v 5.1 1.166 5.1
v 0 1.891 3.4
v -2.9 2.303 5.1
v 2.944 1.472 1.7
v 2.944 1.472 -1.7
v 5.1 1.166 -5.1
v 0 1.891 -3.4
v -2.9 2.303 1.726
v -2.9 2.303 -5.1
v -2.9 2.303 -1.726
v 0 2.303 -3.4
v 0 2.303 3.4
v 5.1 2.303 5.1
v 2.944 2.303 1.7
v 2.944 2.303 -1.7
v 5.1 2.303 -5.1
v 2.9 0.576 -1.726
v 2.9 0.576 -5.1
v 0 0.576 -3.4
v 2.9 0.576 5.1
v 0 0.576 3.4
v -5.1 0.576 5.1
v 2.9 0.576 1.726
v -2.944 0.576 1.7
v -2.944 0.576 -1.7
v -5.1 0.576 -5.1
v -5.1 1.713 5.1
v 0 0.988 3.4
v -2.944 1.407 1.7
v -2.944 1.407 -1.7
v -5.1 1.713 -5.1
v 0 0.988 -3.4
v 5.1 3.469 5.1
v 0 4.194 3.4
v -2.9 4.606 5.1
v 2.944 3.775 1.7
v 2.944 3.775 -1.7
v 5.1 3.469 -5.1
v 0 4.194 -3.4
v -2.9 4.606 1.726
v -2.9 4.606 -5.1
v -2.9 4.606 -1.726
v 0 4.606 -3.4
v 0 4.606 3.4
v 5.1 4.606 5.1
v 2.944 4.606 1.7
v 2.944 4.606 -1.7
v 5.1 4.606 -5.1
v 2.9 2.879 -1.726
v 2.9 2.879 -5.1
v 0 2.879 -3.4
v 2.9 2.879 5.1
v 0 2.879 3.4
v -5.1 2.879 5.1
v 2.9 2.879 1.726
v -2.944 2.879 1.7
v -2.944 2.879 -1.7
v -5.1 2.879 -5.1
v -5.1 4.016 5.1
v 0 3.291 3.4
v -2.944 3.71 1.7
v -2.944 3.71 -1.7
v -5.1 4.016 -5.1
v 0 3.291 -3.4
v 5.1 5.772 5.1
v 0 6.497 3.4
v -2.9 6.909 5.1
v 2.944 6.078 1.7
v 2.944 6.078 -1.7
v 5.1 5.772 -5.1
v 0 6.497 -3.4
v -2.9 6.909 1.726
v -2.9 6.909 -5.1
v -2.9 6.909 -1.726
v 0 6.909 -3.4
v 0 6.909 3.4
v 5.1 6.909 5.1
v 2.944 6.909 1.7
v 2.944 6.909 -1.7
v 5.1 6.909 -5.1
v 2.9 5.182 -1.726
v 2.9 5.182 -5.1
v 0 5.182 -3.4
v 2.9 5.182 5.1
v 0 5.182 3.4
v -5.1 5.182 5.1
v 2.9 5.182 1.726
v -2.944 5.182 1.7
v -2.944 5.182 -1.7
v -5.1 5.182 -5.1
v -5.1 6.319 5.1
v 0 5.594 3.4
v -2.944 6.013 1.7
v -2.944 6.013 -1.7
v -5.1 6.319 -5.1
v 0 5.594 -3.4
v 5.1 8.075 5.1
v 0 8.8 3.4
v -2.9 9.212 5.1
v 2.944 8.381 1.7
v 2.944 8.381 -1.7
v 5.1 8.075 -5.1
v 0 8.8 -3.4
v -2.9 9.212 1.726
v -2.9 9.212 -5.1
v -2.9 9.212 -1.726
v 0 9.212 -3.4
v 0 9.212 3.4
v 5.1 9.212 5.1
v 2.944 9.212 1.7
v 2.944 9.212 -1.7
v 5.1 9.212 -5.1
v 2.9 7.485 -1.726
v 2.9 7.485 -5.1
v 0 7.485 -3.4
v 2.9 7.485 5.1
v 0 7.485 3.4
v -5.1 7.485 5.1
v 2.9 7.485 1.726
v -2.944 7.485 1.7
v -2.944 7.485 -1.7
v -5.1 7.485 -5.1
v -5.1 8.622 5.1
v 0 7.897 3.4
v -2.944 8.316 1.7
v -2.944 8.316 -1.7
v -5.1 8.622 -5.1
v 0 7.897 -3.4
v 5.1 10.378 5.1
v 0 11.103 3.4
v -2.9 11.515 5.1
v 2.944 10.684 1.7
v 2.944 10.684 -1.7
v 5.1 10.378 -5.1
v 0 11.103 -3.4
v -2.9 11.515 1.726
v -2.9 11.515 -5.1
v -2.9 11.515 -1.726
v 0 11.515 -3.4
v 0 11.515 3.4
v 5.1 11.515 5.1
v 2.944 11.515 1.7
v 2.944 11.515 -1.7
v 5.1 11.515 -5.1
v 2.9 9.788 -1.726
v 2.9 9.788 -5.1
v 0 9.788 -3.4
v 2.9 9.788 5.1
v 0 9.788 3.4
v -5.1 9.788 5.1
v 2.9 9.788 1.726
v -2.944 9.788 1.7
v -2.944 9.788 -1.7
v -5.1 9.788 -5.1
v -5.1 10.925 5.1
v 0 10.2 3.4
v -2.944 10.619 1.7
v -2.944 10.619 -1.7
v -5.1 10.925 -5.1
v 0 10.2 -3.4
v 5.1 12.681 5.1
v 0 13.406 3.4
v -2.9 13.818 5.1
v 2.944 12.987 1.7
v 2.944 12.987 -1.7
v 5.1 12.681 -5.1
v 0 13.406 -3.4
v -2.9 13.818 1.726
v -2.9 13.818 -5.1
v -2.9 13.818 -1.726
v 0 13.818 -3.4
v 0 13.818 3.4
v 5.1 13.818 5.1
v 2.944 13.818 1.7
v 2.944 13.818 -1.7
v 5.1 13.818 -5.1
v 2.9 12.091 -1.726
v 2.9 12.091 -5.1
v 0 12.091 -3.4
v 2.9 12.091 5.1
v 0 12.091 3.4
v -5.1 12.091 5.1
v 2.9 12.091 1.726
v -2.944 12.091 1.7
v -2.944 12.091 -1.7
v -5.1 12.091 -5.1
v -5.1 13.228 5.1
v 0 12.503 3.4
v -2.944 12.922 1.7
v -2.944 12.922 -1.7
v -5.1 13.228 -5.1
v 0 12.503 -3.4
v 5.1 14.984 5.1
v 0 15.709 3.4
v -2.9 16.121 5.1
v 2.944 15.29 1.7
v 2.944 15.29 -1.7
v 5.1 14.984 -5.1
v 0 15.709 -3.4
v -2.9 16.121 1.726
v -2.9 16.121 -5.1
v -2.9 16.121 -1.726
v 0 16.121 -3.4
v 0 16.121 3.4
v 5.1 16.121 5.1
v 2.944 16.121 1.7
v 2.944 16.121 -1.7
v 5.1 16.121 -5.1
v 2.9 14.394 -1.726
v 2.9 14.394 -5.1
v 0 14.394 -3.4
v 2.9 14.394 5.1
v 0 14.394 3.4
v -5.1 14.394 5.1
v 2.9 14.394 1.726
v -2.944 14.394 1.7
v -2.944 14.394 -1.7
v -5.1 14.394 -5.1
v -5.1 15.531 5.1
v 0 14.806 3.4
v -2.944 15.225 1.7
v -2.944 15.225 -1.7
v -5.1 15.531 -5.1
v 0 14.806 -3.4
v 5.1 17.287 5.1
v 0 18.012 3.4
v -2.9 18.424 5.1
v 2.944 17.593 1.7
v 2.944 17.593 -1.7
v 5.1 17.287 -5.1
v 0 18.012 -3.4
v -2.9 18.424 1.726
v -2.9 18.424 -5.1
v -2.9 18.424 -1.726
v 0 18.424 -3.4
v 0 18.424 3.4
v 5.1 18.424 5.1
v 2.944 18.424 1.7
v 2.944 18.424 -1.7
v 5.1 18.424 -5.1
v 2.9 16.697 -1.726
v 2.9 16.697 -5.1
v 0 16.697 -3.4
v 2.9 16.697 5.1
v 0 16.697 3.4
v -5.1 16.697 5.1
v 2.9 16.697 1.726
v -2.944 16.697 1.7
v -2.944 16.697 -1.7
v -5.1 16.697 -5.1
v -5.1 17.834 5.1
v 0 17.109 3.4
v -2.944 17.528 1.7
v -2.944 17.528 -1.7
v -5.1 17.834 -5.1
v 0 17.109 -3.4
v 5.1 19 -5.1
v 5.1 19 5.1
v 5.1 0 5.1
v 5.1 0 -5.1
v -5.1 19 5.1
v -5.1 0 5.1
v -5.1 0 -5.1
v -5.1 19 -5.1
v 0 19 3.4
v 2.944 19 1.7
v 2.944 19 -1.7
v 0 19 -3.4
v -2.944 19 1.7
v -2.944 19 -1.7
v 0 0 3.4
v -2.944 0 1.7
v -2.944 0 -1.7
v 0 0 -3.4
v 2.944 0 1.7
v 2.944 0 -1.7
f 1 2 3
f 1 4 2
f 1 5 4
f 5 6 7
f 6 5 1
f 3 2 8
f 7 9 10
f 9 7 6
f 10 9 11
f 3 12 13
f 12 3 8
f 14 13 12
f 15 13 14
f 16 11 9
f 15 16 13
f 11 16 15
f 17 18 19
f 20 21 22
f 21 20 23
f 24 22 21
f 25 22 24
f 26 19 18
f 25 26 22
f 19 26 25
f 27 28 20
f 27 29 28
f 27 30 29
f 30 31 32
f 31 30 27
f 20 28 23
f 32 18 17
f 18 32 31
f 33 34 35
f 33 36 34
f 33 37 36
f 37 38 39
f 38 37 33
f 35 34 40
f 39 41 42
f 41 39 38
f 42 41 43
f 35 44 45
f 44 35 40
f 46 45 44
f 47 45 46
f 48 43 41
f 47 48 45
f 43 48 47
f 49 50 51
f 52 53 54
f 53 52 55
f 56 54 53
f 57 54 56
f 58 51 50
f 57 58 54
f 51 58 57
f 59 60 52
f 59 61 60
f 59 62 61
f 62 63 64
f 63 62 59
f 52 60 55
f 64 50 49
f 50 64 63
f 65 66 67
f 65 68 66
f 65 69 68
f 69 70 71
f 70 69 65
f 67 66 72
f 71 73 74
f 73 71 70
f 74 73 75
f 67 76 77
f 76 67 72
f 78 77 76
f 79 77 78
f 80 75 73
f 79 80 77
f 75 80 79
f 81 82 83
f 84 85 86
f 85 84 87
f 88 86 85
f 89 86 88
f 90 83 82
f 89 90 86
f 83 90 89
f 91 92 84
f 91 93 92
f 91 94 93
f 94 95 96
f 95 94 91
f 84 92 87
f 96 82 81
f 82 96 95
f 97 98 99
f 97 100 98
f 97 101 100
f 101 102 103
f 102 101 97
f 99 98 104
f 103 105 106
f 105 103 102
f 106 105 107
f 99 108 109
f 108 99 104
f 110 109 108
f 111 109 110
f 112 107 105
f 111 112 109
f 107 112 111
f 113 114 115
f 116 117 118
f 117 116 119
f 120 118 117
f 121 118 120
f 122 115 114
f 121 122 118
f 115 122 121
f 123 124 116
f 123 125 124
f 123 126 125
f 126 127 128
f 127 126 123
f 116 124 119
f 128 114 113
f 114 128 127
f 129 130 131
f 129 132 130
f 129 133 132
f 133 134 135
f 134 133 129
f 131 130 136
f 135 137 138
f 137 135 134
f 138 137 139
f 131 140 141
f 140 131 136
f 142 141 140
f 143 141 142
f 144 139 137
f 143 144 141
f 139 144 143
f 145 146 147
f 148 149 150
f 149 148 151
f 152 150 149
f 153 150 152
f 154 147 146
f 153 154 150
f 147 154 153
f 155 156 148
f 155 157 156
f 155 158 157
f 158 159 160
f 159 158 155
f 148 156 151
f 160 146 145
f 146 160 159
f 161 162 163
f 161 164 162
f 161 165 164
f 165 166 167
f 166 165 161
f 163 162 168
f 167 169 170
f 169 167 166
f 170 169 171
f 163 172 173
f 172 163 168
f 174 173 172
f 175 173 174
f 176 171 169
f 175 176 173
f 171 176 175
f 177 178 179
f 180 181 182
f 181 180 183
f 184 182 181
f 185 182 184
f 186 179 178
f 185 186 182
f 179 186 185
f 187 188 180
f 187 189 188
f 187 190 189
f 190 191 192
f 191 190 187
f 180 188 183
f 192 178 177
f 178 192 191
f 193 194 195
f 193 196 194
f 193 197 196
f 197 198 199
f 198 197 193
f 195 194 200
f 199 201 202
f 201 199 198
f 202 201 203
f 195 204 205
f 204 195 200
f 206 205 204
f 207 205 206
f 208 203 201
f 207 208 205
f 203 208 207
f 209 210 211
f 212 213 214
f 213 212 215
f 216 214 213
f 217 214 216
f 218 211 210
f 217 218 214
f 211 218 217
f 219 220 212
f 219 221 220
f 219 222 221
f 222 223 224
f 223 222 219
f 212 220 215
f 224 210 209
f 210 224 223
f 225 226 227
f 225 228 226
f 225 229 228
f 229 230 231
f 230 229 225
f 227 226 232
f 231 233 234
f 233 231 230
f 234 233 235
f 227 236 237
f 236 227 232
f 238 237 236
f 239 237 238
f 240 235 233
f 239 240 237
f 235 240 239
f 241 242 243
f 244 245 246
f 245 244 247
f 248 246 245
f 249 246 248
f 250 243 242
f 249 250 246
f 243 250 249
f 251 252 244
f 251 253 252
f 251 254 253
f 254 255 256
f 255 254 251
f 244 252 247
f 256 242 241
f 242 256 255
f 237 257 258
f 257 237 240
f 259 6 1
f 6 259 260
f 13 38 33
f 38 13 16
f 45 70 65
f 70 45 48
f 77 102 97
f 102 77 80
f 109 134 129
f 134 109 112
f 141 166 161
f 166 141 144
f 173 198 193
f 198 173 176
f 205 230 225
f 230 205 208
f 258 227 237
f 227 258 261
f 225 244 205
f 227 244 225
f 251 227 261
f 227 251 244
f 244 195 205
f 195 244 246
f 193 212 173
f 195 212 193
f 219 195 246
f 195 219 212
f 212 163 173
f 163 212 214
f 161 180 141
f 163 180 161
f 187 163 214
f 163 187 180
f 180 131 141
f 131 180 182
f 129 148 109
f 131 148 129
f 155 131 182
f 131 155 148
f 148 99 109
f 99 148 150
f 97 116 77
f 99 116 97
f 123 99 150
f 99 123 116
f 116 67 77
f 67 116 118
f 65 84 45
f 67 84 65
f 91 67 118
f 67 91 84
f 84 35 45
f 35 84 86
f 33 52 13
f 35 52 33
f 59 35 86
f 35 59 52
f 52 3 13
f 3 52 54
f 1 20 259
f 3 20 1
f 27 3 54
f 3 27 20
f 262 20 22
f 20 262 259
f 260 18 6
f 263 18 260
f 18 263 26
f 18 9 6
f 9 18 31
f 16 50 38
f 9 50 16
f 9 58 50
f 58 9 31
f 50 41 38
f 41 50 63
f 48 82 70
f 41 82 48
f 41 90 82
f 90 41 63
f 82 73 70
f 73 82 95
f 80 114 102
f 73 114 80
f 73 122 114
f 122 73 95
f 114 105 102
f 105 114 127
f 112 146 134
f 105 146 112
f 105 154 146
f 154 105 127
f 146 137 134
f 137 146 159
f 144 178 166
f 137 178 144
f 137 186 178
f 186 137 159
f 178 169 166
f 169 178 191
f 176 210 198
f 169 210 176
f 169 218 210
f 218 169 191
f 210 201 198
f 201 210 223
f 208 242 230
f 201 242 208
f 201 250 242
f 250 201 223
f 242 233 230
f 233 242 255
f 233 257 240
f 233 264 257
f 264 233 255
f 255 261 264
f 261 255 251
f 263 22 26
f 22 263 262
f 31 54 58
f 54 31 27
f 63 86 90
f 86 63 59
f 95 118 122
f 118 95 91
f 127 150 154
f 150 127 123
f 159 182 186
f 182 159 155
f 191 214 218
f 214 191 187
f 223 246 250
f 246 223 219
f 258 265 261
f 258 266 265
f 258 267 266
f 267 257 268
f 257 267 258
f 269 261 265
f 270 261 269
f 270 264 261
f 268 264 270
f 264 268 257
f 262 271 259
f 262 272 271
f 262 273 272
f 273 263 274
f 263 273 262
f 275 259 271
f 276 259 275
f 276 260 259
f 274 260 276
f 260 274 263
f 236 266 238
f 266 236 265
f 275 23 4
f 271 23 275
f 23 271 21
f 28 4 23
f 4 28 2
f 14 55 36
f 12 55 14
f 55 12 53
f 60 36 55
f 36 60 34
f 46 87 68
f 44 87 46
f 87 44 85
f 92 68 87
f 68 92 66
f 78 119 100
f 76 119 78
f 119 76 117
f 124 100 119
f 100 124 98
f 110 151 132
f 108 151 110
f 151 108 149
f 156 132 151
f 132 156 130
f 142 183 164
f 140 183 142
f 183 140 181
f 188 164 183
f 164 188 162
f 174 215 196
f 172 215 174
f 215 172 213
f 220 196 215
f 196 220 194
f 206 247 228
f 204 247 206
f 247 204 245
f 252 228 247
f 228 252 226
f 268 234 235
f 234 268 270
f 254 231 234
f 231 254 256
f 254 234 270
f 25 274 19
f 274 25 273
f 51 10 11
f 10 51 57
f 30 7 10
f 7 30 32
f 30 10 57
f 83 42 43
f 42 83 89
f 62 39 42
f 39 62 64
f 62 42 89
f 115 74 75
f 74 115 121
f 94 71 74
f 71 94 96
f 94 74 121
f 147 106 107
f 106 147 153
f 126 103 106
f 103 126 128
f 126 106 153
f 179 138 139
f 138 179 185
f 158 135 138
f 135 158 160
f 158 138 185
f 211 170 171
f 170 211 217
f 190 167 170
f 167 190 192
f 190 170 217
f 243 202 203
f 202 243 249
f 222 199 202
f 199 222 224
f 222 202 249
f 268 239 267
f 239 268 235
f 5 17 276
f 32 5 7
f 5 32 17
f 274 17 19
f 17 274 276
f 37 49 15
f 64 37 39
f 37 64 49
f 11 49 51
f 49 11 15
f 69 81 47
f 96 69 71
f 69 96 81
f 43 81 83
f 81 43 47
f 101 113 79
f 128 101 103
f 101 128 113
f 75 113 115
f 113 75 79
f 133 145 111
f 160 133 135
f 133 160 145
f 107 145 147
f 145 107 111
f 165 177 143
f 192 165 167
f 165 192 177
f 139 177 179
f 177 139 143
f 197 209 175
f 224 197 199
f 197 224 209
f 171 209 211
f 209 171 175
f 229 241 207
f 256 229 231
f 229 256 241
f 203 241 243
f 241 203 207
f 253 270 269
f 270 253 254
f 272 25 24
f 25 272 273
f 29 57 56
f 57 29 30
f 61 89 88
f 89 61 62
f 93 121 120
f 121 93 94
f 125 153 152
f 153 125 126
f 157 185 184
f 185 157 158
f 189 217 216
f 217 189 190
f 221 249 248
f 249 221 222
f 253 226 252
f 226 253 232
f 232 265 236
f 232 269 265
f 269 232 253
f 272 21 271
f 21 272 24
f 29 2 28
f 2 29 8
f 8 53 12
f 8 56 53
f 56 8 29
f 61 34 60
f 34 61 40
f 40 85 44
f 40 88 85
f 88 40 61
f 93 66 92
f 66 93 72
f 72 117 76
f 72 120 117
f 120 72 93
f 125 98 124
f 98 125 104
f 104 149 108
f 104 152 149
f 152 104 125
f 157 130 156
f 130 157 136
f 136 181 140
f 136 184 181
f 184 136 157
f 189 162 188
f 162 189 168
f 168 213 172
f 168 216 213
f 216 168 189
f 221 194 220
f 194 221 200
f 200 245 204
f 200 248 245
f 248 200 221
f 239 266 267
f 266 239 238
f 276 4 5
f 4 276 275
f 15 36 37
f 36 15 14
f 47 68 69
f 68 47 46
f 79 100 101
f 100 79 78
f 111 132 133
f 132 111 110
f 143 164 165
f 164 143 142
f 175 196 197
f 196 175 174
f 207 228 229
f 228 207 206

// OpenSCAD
//  The length of the spring
length = 19;

//  Dimension of the frontal square form of the spring
radiusSpring = 5.1;

//  Radius of the (optional) hole through the spring
radiusHole = 6.8 / 2;

//  Amount of leaves in the spring
cuts = 16;  //   [2,4,6,8,10,12,14,16,18,20,22,24,26,28,30,32,34,36,38,39,40,42,44,46,48,50]

//  Depth of the leaves
cutDepth = 8;

module spring(){
    difference(){
        translate([-radiusSpring, 0, -radiusSpring]){
            cube([2 * radiusSpring, length, 2 * radiusSpring]);
        }
        rotate([-90,30,0]){
            translate([0,0,-0.1]){
                cylinder(r = radiusHole, h = length + 0.2, $fn = 6);
            }
        }
        translate([-radiusSpring, 0, -radiusSpring]){
            triangleCut();
        }
    }
}

module triangleCut(){
    length2 = length * cuts / (cuts + 0.5);
    for(i = [1:cuts]){
        if(i%2 == 0){
            translate([0,0,-0.1]){
                linear_extrude(height = 2 * radiusSpring + 0.2){
                    polygon(points  =   [   [-0.1, length2 / cuts * (i - 1.5)],
                                            [cutDepth, length2 / cuts * (i - 1.5)],
                                            [-0.1, length2 / cuts * (i - 0.5)],
                                        ],
                            paths = [[0,1,2]]);
                }
            }
        }
        else{
            translate([0,0,-0.1]){
                linear_extrude(height = 2 * radiusSpring + 0.2){
                    polygon(points  =   [   [2 * radiusSpring + 0.1, length2 / cuts * (i + 1)],
                                                [-cutDepth +2 * radiusSpring, length2 / cuts * (i + 1)],
                                                [2 * radiusSpring + 0.1, length2 / cuts * (i)],
                                            ],
                                paths = [[0,1,2]]);
                }
            }
        }
    }
}

spring();
//triangleCut();
